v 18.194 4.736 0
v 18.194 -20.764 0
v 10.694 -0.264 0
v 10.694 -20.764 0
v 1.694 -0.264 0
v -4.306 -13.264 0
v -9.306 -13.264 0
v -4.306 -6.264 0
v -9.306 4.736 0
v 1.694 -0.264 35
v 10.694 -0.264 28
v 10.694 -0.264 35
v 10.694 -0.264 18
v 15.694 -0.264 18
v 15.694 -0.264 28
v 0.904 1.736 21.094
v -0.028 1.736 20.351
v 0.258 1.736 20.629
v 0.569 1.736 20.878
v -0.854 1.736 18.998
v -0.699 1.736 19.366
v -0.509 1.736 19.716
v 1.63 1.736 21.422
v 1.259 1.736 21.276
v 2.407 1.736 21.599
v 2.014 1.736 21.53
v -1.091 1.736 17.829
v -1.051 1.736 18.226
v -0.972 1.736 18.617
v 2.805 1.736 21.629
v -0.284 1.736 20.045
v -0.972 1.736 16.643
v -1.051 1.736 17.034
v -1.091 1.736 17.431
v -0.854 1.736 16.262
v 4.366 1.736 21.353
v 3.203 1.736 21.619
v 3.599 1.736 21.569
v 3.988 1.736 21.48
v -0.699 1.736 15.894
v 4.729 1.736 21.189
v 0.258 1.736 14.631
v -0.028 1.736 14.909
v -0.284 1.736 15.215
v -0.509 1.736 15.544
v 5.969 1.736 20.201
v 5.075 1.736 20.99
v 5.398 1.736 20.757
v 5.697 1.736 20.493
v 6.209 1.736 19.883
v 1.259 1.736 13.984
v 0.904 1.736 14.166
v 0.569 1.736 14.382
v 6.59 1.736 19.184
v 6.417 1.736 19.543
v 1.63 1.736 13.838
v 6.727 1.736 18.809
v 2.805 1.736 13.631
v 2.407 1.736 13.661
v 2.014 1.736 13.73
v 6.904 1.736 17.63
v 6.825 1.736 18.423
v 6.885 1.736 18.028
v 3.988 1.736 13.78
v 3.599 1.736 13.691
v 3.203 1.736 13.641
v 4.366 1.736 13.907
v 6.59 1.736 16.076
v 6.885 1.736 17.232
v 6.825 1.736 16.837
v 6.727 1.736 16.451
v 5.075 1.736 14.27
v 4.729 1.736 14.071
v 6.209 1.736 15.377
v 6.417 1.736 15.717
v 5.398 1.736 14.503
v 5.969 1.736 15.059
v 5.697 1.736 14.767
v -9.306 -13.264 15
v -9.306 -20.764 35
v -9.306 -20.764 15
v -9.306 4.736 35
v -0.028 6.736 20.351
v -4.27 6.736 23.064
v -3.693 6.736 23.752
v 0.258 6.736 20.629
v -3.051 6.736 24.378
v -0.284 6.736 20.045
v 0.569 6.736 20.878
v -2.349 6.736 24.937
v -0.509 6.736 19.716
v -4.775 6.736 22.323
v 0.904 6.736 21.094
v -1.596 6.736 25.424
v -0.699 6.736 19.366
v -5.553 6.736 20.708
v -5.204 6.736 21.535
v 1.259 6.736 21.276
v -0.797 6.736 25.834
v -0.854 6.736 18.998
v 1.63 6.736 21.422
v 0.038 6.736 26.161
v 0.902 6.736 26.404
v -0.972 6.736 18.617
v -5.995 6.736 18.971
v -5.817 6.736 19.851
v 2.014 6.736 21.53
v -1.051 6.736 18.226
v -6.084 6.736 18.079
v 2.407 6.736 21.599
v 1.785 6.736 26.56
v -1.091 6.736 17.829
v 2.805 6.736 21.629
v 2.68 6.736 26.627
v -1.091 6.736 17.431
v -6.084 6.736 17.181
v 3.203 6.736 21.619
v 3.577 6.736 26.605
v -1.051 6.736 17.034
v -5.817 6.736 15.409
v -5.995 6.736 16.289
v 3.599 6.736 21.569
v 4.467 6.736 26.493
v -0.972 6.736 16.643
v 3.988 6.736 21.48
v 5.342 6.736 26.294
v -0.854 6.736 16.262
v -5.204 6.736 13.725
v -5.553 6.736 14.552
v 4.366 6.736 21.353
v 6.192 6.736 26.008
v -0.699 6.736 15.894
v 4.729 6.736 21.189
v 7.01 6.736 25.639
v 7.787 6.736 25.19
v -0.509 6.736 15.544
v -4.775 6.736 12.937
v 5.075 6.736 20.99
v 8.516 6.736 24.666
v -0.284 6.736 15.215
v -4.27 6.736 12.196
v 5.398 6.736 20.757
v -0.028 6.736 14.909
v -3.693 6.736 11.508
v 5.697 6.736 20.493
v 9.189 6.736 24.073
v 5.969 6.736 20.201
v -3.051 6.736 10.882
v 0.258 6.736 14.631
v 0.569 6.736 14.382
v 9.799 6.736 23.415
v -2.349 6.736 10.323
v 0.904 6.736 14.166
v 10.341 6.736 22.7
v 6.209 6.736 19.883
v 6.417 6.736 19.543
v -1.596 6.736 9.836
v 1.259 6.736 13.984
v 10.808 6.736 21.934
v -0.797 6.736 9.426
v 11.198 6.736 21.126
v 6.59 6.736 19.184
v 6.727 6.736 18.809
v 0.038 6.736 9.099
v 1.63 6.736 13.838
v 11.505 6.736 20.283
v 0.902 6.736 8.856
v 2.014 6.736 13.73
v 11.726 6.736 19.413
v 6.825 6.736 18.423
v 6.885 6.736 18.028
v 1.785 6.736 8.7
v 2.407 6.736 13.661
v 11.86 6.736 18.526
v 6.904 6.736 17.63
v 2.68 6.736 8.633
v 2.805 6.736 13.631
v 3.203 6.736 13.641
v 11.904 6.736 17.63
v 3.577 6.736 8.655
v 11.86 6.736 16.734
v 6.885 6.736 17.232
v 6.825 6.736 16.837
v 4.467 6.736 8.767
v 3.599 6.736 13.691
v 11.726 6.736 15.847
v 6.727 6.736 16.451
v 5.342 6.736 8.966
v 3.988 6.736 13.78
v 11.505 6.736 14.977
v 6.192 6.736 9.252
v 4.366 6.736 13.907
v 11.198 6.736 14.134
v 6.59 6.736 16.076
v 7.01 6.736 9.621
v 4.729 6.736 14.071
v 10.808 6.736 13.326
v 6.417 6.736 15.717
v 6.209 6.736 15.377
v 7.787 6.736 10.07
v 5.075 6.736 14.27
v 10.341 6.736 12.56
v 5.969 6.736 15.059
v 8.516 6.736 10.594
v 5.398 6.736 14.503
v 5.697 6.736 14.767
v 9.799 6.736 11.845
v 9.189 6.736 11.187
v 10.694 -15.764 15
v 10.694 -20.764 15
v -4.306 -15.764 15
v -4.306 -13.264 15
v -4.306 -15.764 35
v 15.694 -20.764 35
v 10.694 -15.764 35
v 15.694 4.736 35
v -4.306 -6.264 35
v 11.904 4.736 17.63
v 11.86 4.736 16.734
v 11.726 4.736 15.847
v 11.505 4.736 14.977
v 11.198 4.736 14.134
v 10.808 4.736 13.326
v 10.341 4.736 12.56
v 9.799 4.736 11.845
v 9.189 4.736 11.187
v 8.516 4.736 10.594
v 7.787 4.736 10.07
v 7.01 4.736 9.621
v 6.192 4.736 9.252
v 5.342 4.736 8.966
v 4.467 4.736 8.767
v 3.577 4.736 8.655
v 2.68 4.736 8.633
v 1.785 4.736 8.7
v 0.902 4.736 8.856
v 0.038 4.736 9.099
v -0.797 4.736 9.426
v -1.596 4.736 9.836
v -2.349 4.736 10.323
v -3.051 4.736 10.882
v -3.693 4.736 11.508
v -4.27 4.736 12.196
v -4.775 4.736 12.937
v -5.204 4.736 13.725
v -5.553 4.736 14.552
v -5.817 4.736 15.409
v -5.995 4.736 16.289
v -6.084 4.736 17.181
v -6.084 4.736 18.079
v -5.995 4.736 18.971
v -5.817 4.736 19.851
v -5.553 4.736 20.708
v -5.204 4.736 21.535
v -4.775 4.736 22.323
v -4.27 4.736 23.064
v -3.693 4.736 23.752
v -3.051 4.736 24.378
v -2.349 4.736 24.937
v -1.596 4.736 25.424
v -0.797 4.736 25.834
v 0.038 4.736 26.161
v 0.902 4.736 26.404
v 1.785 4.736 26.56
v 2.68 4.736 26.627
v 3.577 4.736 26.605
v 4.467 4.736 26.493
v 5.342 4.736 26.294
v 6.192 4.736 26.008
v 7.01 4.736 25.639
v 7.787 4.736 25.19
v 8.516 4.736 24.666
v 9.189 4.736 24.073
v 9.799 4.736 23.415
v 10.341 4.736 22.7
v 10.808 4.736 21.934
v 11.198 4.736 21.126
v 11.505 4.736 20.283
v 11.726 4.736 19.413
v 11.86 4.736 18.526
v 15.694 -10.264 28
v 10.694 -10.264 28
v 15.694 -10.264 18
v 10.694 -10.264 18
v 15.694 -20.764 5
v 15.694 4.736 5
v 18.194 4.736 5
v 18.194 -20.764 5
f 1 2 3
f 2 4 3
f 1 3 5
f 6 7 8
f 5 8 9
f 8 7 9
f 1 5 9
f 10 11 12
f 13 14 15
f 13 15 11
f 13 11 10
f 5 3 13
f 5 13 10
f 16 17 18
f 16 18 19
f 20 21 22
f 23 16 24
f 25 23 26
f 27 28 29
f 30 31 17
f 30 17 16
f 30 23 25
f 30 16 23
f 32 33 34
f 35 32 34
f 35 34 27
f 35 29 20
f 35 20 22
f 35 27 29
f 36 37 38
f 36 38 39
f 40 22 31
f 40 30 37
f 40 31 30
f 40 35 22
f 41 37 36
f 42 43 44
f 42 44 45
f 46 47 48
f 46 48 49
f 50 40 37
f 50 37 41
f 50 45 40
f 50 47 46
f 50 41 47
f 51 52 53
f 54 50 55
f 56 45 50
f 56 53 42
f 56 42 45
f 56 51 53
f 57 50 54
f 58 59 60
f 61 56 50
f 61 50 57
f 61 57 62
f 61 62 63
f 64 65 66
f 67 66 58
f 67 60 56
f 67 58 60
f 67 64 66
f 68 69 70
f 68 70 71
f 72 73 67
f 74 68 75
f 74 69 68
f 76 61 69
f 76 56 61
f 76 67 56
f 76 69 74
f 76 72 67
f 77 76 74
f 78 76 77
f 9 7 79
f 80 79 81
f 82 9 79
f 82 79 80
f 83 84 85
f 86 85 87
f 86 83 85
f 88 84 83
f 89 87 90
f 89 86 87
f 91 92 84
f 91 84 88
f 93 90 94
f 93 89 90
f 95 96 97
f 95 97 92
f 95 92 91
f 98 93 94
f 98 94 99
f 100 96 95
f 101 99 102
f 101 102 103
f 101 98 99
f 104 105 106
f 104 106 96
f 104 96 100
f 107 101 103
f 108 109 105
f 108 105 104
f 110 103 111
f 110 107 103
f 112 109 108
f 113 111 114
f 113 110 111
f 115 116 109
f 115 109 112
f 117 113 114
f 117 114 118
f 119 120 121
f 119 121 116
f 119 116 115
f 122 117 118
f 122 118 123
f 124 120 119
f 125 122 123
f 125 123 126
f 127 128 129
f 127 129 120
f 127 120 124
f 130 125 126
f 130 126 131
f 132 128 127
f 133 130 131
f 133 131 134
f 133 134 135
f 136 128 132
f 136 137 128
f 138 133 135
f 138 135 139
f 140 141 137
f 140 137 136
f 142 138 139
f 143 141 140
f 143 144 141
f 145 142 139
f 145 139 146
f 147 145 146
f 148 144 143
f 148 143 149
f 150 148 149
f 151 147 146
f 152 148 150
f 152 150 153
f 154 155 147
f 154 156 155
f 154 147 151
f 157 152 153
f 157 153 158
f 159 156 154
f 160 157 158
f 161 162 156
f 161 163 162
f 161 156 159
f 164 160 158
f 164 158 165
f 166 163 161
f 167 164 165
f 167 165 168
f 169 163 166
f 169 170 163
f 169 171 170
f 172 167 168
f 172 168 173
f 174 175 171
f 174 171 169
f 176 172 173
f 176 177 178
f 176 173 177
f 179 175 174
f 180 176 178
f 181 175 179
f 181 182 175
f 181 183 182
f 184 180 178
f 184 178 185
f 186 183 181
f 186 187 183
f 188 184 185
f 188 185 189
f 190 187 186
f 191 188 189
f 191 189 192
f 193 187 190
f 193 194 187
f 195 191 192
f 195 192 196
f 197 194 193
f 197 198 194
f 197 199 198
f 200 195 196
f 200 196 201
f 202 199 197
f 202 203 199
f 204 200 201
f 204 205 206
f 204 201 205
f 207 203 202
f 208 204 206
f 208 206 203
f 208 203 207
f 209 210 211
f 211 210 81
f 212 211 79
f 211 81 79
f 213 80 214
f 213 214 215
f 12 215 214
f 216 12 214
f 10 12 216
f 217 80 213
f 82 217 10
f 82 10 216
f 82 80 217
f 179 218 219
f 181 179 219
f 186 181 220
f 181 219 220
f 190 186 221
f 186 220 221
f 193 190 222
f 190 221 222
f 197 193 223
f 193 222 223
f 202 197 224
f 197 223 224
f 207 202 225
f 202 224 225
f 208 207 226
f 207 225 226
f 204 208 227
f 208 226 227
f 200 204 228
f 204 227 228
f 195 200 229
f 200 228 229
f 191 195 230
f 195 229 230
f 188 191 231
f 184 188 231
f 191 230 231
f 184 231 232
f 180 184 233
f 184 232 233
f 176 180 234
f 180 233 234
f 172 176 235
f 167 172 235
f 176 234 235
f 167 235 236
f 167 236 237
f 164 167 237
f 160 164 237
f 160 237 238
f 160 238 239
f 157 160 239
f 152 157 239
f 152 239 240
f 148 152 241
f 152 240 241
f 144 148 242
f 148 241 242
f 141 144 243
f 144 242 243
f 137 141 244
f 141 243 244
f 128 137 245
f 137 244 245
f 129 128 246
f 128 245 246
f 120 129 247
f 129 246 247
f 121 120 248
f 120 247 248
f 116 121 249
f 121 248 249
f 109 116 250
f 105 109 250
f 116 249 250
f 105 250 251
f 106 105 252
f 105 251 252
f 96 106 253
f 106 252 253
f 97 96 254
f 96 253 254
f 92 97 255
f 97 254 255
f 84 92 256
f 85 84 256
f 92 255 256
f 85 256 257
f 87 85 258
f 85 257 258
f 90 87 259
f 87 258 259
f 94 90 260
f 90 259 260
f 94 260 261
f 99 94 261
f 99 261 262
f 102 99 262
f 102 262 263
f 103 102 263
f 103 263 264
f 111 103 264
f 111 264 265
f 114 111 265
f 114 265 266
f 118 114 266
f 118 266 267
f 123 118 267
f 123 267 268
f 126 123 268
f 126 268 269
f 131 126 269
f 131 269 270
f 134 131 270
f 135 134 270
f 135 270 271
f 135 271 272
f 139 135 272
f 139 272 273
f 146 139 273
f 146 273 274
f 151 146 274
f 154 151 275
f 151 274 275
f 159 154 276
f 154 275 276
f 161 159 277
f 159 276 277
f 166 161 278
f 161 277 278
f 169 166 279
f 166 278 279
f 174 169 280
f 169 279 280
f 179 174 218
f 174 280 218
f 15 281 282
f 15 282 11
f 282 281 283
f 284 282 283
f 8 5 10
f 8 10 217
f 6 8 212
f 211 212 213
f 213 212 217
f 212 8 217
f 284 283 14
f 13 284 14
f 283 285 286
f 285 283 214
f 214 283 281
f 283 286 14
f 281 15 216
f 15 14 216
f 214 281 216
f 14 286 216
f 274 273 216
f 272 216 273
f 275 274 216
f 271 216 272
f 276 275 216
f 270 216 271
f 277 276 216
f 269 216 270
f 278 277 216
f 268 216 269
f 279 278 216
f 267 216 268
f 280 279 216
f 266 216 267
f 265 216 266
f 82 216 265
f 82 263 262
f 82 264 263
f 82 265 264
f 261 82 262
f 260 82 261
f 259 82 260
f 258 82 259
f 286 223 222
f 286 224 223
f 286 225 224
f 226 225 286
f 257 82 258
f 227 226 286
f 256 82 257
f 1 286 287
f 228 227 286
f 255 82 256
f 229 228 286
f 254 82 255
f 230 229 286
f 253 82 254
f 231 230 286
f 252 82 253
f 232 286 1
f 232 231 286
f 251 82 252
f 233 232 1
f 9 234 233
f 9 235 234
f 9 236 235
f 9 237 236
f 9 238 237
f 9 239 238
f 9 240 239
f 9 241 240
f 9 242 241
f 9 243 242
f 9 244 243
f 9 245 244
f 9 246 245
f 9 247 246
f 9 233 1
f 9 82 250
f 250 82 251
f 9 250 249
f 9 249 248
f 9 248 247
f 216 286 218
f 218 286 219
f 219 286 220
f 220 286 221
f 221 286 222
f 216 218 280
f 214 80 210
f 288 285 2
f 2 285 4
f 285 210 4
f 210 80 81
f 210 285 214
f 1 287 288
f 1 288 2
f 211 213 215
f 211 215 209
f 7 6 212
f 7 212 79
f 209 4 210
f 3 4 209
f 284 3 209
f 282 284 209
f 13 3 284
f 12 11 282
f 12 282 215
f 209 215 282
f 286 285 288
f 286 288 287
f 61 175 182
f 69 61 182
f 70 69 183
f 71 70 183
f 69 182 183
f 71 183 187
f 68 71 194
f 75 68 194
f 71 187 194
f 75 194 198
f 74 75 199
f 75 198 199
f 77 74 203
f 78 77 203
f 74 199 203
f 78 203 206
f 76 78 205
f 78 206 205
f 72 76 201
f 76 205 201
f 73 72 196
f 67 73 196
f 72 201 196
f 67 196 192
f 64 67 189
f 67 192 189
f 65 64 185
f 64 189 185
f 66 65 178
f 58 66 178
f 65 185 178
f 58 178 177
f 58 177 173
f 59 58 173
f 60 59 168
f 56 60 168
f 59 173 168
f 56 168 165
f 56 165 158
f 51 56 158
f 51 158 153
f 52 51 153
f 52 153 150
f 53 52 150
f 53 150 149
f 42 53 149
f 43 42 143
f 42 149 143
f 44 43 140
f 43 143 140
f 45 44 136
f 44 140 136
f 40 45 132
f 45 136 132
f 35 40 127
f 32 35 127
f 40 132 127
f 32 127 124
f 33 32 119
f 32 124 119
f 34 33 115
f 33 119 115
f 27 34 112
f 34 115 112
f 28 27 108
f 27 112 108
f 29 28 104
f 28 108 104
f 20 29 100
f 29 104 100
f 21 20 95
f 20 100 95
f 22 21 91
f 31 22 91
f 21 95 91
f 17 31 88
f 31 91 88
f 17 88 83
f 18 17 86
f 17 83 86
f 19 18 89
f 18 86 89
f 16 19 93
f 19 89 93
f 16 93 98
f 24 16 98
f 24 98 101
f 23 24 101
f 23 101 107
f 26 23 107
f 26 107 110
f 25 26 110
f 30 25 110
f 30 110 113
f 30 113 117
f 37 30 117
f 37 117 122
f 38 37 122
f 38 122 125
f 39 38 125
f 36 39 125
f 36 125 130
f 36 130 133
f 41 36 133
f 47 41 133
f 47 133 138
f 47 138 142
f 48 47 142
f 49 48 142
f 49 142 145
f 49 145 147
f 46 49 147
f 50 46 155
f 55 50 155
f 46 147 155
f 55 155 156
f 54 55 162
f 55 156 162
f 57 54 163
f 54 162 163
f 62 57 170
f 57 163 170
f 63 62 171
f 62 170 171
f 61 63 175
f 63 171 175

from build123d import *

# Parameters (mm, degrees)
BOSS_EXTRUDE1_DEPTH = 35
SKETCH2_R           = 9
BOSS_EXTRUDE2_DEPTH = 2
SKETCH3_R           = 4
CUT_EXTRUDE1_DEPTH  = 5
SKETCH4_W           = 5
SKETCH4_H           = 35
BOSS_EXTRUDE3_DEPTH = 20.5
SKETCH6_W           = 5
SKETCH6_H           = 25.5
BOSS_EXTRUDE4_DEPTH = 2.5
SKETCH7_W           = 5
SKETCH7_H           = 20
BOSS_EXTRUDE5_DEPTH = 7.5
SKETCH8_W           = 20
SKETCH8_H           = 5
BOSS_EXTRUDE6_DEPTH = 15
SKETCH10_W          = 10
SKETCH10_H          = 10
CUT_EXTRUDE2_DEPTH  = 5


with BuildPart() as part:
    # Sketch1 → Boss-Extrude1 (new body)
    with BuildSketch(Plane.XY):
        Polygon((-9.305574102, 4.73561153), (15.694425898, 4.73561153), (15.694425898, -0.26438847), (1.694425898, -0.26438847), (-4.305574102, -6.26438847), (-4.305574102, -13.26438847), (-9.305574102, -13.26438847), align=None)
    extrude(amount=BOSS_EXTRUDE1_DEPTH)

    # Sketch2 → Boss-Extrude2 (add)
    with BuildSketch(Plane(origin=(0, 4.73561153, 0), x_dir=(1, 0, 0), z_dir=(0, 1, 0))):
        with Locations((2.904425898, -17.63)):
            Circle(SKETCH2_R)
    extrude(amount=BOSS_EXTRUDE2_DEPTH)

    # Sketch3 → Cut-Extrude1 (cut)
    with BuildSketch(Plane(origin=(0, 6.73561153, 0), x_dir=(1, 0, 0), z_dir=(0, 1, 0))):
        with Locations((2.904425898, -17.63)):
            Circle(SKETCH3_R)
    extrude(amount=-CUT_EXTRUDE1_DEPTH, mode=Mode.SUBTRACT)

    # Sketch4 → Boss-Extrude3 (add)
    with BuildSketch(Plane.XZ.offset(0.26438847)):
        with Locations((13.194425898, 17.5)):
            Rectangle(SKETCH4_W, SKETCH4_H)
    extrude(amount=BOSS_EXTRUDE3_DEPTH)

    # Sketch6 → Boss-Extrude4 (add)
    with BuildSketch(Plane(origin=(15.694425898, 0, 0), x_dir=(0, 0, -1), z_dir=(1, 0, 0))):
        with Locations((-2.5, -8.01438847)):
            Rectangle(SKETCH6_W, SKETCH6_H)
    extrude(amount=BOSS_EXTRUDE4_DEPTH)

    # Sketch7 → Boss-Extrude5 (add)
    with BuildSketch(Plane.XZ.offset(13.26438847)):
        with Locations((-6.805574102, 25)):
            Rectangle(SKETCH7_W, SKETCH7_H)
    extrude(amount=BOSS_EXTRUDE5_DEPTH)

    # Sketch8 → Boss-Extrude6 (add)
    with BuildSketch(Plane(origin=(-4.305574102, 0, 0), x_dir=(0, 0, -1), z_dir=(1, 0, 0))):
        with Locations((-25, -18.26438847)):
            Rectangle(SKETCH8_W, SKETCH8_H)
    extrude(amount=BOSS_EXTRUDE6_DEPTH)

    # Sketch10 → Cut-Extrude2 (cut)
    with BuildSketch(Plane(origin=(15.694425898, 0, 0), x_dir=(0, 0, -1), z_dir=(1, 0, 0))):
        with Locations((-23, -5.26438847)):
            Rectangle(SKETCH10_W, SKETCH10_H)
    extrude(amount=-CUT_EXTRUDE2_DEPTH, mode=Mode.SUBTRACT)


solid = part.part
